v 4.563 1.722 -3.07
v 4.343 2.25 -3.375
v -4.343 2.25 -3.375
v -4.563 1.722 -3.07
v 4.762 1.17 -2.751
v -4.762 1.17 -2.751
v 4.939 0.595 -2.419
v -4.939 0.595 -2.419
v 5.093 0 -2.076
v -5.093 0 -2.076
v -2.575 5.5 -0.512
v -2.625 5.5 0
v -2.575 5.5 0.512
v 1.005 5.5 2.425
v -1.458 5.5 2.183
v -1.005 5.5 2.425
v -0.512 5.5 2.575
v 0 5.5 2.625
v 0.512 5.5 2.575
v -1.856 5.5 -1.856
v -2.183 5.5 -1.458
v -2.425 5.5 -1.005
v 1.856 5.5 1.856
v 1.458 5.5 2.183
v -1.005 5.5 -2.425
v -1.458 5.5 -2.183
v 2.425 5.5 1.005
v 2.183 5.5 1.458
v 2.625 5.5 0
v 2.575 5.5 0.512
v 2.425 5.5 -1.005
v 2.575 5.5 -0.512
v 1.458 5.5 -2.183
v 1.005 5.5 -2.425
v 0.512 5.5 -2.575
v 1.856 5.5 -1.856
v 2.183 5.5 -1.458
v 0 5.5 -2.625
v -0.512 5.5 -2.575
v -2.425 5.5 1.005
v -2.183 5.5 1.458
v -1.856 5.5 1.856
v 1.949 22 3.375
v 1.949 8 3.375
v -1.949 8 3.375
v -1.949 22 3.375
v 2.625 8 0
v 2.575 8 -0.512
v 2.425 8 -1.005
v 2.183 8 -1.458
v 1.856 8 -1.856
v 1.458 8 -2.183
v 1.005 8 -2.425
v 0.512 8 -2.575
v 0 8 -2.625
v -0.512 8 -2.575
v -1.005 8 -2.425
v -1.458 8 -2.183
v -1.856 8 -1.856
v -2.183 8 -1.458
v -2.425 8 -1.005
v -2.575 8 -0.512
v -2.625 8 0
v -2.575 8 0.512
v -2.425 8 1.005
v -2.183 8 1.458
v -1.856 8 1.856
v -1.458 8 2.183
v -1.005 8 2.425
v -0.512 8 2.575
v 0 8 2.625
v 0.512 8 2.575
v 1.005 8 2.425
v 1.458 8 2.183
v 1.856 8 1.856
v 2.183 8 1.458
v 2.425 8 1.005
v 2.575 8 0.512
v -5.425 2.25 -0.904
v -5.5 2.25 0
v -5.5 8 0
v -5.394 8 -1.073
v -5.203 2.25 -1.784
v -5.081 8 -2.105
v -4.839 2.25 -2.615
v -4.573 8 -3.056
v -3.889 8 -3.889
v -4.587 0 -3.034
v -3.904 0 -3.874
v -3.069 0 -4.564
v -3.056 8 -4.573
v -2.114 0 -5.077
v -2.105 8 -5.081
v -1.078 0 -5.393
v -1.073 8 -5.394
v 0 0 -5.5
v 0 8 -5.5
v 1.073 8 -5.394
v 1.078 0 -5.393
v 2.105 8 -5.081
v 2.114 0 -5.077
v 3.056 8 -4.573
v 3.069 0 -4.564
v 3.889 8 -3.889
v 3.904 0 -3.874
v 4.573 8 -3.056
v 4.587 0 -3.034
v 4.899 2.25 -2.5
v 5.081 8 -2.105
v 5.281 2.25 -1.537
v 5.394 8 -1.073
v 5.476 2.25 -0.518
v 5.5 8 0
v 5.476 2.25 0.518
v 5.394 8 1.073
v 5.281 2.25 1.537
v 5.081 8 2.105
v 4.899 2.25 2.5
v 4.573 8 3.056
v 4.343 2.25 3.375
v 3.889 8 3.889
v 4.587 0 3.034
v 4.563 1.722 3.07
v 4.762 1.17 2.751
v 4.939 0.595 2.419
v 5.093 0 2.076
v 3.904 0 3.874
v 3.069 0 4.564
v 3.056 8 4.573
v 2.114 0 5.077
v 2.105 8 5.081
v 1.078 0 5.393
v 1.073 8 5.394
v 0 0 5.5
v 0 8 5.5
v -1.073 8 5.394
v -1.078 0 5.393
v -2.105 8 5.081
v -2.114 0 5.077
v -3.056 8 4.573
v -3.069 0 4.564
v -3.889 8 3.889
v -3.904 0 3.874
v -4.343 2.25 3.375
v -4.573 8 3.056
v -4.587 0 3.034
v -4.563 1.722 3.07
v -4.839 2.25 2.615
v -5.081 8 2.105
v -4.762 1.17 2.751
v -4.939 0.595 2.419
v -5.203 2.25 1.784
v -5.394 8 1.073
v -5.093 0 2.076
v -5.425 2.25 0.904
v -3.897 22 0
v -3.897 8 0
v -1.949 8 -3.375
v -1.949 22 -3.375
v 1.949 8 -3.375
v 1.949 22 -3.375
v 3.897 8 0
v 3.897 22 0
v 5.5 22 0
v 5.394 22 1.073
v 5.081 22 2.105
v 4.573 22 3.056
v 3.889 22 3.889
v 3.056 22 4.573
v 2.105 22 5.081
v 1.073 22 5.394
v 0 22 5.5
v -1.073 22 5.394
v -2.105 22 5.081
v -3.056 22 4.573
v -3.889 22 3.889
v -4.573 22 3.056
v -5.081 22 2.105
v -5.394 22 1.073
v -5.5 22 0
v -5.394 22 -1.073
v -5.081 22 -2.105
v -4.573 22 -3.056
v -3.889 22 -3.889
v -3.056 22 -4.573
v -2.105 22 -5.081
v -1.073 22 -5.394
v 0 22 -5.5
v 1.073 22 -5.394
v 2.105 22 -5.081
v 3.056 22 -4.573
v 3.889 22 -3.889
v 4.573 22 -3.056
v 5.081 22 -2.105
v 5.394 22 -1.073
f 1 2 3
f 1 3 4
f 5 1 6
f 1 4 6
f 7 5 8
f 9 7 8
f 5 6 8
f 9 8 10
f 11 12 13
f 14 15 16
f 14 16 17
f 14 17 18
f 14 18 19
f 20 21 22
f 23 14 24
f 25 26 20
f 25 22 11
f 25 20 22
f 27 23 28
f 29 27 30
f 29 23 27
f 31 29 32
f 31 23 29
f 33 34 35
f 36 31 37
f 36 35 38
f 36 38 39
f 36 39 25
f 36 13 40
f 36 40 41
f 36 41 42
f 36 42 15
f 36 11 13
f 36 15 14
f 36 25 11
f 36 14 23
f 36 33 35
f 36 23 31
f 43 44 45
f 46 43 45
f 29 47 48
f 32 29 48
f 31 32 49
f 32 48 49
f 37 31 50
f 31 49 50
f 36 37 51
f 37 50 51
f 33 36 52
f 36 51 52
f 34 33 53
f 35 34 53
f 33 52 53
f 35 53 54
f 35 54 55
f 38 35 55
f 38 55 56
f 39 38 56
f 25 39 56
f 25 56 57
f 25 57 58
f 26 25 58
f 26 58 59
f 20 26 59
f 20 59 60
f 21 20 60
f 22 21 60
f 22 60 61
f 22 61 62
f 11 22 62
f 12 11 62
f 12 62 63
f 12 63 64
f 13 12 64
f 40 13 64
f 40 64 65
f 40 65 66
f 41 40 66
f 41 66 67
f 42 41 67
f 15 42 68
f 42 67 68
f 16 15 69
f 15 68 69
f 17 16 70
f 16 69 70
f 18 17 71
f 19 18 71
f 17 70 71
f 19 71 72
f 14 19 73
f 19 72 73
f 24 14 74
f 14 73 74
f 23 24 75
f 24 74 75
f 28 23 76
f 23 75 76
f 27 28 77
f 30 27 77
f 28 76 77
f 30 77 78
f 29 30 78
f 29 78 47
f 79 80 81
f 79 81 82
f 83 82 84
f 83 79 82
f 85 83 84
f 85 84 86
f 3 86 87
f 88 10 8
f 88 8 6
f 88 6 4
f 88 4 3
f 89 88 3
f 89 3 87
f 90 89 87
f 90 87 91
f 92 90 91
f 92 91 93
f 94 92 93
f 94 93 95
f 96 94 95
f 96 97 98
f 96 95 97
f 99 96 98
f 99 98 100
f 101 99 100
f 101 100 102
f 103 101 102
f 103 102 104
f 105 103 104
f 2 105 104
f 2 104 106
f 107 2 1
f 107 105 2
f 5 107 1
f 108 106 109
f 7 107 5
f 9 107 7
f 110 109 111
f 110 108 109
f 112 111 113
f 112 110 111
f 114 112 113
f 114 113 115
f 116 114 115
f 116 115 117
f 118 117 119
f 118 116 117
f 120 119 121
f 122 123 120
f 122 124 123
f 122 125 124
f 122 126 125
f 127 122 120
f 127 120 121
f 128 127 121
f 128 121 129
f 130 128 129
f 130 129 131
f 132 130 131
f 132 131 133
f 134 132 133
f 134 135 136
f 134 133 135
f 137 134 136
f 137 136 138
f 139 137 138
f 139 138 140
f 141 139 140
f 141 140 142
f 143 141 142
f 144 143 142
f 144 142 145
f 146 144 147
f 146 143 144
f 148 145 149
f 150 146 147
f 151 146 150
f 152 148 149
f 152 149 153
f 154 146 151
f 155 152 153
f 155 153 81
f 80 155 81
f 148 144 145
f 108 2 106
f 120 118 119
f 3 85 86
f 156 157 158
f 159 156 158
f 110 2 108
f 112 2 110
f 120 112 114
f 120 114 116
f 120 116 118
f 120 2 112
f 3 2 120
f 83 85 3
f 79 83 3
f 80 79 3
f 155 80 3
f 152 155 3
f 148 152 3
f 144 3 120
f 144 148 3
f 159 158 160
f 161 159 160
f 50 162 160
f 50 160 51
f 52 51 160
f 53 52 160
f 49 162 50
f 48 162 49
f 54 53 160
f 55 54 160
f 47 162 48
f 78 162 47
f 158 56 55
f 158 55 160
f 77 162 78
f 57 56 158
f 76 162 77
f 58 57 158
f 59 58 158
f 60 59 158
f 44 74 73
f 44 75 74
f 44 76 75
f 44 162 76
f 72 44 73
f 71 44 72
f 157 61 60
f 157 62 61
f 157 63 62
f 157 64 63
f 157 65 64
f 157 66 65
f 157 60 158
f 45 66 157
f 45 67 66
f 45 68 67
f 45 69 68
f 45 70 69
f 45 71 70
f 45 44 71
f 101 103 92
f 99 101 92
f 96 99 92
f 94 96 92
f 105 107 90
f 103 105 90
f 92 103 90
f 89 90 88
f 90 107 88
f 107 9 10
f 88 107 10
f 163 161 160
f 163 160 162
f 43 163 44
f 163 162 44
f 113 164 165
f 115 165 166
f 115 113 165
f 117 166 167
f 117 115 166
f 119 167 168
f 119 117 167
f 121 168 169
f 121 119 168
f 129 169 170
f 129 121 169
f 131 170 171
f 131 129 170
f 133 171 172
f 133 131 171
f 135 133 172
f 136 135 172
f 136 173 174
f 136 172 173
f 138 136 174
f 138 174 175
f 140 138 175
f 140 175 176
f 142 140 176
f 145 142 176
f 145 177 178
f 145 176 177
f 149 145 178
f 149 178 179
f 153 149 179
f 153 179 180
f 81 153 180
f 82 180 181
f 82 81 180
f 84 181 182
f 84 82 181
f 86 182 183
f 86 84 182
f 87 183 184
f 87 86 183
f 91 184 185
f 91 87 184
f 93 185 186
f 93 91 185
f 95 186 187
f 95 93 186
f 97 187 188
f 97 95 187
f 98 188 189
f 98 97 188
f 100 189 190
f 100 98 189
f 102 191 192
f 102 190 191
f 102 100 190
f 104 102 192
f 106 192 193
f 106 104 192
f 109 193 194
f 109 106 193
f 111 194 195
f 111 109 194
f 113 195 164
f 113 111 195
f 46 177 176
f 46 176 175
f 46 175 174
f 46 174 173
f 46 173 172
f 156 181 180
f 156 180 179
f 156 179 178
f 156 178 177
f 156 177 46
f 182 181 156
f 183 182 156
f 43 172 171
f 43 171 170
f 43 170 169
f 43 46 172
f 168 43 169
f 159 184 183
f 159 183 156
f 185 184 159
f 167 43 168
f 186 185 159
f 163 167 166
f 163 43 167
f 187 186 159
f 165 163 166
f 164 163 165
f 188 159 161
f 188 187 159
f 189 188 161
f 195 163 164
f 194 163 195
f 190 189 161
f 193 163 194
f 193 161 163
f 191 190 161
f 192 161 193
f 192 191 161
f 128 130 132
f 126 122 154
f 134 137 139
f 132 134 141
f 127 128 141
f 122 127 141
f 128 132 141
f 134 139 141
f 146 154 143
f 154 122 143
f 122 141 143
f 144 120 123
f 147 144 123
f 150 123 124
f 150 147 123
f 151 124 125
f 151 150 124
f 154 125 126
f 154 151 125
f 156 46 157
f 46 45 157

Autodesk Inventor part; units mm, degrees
ref_plane "YZ Plane" through (0, 0, 0) normal (1, 0, 0) x (0, 1, 0)
ref_plane "XZ Plane" through (0, 0, 0) normal (0, 1, 0) x (-1, 0, 0)
ref_plane "XY Plane" through (0, 0, 0) normal (0, 0, 1) x (1, 0, 0)
sketch "Sketch1" plane through (0, 0, 0) normal (0, 1, 0) x (-1, 0, 0)
  circle A0 centre (0, 0) radius 5.5
  dimension "d0" = 11
extrude "Extrusion1" add sketch "Sketch1" along normal blind 8
sketch "Sketch2" plane through (0, 0, 0) normal (1, 0, 0) x (0, 1, 0)
  line L0 (0, 0) -> (2.7456, 0)
  line L1 (2.25, 0) -> (2.25, 3.375)
  line L2 (2.25, 3.375) -> (0, 2.076)
  line L3 (0, -5.5) -> (0, 5.5) construction
  line L4 (2.25, 0) -> (2.25, -3.375)
  line L5 (2.25, -3.375) -> (0, -2.076)
  line L6 (0, -2.076) -> (0, 2.076)
  dimension "d9" = 3.375
  dimension "d10" = 2.25
  dimension "d11" = 60
extrude "Extrusion2" cut sketch "Sketch2" along normal through all both and the other way through all
sketch "Sketch3" plane through (0, 8, 0) normal (0, 1, 0) x (1, 0, 0)
  circle A0 centre (0, 0) radius 5.5 projected
  line L0 (1.9486, 3.375) -> (3.8971, 0)
  line L1 (3.8971, 0) -> (1.9486, -3.375)
  line L2 (1.9486, -3.375) -> (-1.9486, -3.375)
  line L3 (-1.9486, -3.375) -> (-3.8971, 0)
  line L4 (-3.8971, 0) -> (-1.9486, 3.375)
  line L5 (-1.9486, 3.375) -> (1.9486, 3.375)
  circle A1 centre (0, 0) radius 2.625
  dimension "d14" = 6.75
  dimension "d15" = 5.25
extrude "Extrusion3" cut sketch "Sketch3" against normal blind 2.5 contours A1
extrude "Extrusion4" add sketch "Sketch3" along normal blind 14 contours A0
properties part number "Varf Biti"
